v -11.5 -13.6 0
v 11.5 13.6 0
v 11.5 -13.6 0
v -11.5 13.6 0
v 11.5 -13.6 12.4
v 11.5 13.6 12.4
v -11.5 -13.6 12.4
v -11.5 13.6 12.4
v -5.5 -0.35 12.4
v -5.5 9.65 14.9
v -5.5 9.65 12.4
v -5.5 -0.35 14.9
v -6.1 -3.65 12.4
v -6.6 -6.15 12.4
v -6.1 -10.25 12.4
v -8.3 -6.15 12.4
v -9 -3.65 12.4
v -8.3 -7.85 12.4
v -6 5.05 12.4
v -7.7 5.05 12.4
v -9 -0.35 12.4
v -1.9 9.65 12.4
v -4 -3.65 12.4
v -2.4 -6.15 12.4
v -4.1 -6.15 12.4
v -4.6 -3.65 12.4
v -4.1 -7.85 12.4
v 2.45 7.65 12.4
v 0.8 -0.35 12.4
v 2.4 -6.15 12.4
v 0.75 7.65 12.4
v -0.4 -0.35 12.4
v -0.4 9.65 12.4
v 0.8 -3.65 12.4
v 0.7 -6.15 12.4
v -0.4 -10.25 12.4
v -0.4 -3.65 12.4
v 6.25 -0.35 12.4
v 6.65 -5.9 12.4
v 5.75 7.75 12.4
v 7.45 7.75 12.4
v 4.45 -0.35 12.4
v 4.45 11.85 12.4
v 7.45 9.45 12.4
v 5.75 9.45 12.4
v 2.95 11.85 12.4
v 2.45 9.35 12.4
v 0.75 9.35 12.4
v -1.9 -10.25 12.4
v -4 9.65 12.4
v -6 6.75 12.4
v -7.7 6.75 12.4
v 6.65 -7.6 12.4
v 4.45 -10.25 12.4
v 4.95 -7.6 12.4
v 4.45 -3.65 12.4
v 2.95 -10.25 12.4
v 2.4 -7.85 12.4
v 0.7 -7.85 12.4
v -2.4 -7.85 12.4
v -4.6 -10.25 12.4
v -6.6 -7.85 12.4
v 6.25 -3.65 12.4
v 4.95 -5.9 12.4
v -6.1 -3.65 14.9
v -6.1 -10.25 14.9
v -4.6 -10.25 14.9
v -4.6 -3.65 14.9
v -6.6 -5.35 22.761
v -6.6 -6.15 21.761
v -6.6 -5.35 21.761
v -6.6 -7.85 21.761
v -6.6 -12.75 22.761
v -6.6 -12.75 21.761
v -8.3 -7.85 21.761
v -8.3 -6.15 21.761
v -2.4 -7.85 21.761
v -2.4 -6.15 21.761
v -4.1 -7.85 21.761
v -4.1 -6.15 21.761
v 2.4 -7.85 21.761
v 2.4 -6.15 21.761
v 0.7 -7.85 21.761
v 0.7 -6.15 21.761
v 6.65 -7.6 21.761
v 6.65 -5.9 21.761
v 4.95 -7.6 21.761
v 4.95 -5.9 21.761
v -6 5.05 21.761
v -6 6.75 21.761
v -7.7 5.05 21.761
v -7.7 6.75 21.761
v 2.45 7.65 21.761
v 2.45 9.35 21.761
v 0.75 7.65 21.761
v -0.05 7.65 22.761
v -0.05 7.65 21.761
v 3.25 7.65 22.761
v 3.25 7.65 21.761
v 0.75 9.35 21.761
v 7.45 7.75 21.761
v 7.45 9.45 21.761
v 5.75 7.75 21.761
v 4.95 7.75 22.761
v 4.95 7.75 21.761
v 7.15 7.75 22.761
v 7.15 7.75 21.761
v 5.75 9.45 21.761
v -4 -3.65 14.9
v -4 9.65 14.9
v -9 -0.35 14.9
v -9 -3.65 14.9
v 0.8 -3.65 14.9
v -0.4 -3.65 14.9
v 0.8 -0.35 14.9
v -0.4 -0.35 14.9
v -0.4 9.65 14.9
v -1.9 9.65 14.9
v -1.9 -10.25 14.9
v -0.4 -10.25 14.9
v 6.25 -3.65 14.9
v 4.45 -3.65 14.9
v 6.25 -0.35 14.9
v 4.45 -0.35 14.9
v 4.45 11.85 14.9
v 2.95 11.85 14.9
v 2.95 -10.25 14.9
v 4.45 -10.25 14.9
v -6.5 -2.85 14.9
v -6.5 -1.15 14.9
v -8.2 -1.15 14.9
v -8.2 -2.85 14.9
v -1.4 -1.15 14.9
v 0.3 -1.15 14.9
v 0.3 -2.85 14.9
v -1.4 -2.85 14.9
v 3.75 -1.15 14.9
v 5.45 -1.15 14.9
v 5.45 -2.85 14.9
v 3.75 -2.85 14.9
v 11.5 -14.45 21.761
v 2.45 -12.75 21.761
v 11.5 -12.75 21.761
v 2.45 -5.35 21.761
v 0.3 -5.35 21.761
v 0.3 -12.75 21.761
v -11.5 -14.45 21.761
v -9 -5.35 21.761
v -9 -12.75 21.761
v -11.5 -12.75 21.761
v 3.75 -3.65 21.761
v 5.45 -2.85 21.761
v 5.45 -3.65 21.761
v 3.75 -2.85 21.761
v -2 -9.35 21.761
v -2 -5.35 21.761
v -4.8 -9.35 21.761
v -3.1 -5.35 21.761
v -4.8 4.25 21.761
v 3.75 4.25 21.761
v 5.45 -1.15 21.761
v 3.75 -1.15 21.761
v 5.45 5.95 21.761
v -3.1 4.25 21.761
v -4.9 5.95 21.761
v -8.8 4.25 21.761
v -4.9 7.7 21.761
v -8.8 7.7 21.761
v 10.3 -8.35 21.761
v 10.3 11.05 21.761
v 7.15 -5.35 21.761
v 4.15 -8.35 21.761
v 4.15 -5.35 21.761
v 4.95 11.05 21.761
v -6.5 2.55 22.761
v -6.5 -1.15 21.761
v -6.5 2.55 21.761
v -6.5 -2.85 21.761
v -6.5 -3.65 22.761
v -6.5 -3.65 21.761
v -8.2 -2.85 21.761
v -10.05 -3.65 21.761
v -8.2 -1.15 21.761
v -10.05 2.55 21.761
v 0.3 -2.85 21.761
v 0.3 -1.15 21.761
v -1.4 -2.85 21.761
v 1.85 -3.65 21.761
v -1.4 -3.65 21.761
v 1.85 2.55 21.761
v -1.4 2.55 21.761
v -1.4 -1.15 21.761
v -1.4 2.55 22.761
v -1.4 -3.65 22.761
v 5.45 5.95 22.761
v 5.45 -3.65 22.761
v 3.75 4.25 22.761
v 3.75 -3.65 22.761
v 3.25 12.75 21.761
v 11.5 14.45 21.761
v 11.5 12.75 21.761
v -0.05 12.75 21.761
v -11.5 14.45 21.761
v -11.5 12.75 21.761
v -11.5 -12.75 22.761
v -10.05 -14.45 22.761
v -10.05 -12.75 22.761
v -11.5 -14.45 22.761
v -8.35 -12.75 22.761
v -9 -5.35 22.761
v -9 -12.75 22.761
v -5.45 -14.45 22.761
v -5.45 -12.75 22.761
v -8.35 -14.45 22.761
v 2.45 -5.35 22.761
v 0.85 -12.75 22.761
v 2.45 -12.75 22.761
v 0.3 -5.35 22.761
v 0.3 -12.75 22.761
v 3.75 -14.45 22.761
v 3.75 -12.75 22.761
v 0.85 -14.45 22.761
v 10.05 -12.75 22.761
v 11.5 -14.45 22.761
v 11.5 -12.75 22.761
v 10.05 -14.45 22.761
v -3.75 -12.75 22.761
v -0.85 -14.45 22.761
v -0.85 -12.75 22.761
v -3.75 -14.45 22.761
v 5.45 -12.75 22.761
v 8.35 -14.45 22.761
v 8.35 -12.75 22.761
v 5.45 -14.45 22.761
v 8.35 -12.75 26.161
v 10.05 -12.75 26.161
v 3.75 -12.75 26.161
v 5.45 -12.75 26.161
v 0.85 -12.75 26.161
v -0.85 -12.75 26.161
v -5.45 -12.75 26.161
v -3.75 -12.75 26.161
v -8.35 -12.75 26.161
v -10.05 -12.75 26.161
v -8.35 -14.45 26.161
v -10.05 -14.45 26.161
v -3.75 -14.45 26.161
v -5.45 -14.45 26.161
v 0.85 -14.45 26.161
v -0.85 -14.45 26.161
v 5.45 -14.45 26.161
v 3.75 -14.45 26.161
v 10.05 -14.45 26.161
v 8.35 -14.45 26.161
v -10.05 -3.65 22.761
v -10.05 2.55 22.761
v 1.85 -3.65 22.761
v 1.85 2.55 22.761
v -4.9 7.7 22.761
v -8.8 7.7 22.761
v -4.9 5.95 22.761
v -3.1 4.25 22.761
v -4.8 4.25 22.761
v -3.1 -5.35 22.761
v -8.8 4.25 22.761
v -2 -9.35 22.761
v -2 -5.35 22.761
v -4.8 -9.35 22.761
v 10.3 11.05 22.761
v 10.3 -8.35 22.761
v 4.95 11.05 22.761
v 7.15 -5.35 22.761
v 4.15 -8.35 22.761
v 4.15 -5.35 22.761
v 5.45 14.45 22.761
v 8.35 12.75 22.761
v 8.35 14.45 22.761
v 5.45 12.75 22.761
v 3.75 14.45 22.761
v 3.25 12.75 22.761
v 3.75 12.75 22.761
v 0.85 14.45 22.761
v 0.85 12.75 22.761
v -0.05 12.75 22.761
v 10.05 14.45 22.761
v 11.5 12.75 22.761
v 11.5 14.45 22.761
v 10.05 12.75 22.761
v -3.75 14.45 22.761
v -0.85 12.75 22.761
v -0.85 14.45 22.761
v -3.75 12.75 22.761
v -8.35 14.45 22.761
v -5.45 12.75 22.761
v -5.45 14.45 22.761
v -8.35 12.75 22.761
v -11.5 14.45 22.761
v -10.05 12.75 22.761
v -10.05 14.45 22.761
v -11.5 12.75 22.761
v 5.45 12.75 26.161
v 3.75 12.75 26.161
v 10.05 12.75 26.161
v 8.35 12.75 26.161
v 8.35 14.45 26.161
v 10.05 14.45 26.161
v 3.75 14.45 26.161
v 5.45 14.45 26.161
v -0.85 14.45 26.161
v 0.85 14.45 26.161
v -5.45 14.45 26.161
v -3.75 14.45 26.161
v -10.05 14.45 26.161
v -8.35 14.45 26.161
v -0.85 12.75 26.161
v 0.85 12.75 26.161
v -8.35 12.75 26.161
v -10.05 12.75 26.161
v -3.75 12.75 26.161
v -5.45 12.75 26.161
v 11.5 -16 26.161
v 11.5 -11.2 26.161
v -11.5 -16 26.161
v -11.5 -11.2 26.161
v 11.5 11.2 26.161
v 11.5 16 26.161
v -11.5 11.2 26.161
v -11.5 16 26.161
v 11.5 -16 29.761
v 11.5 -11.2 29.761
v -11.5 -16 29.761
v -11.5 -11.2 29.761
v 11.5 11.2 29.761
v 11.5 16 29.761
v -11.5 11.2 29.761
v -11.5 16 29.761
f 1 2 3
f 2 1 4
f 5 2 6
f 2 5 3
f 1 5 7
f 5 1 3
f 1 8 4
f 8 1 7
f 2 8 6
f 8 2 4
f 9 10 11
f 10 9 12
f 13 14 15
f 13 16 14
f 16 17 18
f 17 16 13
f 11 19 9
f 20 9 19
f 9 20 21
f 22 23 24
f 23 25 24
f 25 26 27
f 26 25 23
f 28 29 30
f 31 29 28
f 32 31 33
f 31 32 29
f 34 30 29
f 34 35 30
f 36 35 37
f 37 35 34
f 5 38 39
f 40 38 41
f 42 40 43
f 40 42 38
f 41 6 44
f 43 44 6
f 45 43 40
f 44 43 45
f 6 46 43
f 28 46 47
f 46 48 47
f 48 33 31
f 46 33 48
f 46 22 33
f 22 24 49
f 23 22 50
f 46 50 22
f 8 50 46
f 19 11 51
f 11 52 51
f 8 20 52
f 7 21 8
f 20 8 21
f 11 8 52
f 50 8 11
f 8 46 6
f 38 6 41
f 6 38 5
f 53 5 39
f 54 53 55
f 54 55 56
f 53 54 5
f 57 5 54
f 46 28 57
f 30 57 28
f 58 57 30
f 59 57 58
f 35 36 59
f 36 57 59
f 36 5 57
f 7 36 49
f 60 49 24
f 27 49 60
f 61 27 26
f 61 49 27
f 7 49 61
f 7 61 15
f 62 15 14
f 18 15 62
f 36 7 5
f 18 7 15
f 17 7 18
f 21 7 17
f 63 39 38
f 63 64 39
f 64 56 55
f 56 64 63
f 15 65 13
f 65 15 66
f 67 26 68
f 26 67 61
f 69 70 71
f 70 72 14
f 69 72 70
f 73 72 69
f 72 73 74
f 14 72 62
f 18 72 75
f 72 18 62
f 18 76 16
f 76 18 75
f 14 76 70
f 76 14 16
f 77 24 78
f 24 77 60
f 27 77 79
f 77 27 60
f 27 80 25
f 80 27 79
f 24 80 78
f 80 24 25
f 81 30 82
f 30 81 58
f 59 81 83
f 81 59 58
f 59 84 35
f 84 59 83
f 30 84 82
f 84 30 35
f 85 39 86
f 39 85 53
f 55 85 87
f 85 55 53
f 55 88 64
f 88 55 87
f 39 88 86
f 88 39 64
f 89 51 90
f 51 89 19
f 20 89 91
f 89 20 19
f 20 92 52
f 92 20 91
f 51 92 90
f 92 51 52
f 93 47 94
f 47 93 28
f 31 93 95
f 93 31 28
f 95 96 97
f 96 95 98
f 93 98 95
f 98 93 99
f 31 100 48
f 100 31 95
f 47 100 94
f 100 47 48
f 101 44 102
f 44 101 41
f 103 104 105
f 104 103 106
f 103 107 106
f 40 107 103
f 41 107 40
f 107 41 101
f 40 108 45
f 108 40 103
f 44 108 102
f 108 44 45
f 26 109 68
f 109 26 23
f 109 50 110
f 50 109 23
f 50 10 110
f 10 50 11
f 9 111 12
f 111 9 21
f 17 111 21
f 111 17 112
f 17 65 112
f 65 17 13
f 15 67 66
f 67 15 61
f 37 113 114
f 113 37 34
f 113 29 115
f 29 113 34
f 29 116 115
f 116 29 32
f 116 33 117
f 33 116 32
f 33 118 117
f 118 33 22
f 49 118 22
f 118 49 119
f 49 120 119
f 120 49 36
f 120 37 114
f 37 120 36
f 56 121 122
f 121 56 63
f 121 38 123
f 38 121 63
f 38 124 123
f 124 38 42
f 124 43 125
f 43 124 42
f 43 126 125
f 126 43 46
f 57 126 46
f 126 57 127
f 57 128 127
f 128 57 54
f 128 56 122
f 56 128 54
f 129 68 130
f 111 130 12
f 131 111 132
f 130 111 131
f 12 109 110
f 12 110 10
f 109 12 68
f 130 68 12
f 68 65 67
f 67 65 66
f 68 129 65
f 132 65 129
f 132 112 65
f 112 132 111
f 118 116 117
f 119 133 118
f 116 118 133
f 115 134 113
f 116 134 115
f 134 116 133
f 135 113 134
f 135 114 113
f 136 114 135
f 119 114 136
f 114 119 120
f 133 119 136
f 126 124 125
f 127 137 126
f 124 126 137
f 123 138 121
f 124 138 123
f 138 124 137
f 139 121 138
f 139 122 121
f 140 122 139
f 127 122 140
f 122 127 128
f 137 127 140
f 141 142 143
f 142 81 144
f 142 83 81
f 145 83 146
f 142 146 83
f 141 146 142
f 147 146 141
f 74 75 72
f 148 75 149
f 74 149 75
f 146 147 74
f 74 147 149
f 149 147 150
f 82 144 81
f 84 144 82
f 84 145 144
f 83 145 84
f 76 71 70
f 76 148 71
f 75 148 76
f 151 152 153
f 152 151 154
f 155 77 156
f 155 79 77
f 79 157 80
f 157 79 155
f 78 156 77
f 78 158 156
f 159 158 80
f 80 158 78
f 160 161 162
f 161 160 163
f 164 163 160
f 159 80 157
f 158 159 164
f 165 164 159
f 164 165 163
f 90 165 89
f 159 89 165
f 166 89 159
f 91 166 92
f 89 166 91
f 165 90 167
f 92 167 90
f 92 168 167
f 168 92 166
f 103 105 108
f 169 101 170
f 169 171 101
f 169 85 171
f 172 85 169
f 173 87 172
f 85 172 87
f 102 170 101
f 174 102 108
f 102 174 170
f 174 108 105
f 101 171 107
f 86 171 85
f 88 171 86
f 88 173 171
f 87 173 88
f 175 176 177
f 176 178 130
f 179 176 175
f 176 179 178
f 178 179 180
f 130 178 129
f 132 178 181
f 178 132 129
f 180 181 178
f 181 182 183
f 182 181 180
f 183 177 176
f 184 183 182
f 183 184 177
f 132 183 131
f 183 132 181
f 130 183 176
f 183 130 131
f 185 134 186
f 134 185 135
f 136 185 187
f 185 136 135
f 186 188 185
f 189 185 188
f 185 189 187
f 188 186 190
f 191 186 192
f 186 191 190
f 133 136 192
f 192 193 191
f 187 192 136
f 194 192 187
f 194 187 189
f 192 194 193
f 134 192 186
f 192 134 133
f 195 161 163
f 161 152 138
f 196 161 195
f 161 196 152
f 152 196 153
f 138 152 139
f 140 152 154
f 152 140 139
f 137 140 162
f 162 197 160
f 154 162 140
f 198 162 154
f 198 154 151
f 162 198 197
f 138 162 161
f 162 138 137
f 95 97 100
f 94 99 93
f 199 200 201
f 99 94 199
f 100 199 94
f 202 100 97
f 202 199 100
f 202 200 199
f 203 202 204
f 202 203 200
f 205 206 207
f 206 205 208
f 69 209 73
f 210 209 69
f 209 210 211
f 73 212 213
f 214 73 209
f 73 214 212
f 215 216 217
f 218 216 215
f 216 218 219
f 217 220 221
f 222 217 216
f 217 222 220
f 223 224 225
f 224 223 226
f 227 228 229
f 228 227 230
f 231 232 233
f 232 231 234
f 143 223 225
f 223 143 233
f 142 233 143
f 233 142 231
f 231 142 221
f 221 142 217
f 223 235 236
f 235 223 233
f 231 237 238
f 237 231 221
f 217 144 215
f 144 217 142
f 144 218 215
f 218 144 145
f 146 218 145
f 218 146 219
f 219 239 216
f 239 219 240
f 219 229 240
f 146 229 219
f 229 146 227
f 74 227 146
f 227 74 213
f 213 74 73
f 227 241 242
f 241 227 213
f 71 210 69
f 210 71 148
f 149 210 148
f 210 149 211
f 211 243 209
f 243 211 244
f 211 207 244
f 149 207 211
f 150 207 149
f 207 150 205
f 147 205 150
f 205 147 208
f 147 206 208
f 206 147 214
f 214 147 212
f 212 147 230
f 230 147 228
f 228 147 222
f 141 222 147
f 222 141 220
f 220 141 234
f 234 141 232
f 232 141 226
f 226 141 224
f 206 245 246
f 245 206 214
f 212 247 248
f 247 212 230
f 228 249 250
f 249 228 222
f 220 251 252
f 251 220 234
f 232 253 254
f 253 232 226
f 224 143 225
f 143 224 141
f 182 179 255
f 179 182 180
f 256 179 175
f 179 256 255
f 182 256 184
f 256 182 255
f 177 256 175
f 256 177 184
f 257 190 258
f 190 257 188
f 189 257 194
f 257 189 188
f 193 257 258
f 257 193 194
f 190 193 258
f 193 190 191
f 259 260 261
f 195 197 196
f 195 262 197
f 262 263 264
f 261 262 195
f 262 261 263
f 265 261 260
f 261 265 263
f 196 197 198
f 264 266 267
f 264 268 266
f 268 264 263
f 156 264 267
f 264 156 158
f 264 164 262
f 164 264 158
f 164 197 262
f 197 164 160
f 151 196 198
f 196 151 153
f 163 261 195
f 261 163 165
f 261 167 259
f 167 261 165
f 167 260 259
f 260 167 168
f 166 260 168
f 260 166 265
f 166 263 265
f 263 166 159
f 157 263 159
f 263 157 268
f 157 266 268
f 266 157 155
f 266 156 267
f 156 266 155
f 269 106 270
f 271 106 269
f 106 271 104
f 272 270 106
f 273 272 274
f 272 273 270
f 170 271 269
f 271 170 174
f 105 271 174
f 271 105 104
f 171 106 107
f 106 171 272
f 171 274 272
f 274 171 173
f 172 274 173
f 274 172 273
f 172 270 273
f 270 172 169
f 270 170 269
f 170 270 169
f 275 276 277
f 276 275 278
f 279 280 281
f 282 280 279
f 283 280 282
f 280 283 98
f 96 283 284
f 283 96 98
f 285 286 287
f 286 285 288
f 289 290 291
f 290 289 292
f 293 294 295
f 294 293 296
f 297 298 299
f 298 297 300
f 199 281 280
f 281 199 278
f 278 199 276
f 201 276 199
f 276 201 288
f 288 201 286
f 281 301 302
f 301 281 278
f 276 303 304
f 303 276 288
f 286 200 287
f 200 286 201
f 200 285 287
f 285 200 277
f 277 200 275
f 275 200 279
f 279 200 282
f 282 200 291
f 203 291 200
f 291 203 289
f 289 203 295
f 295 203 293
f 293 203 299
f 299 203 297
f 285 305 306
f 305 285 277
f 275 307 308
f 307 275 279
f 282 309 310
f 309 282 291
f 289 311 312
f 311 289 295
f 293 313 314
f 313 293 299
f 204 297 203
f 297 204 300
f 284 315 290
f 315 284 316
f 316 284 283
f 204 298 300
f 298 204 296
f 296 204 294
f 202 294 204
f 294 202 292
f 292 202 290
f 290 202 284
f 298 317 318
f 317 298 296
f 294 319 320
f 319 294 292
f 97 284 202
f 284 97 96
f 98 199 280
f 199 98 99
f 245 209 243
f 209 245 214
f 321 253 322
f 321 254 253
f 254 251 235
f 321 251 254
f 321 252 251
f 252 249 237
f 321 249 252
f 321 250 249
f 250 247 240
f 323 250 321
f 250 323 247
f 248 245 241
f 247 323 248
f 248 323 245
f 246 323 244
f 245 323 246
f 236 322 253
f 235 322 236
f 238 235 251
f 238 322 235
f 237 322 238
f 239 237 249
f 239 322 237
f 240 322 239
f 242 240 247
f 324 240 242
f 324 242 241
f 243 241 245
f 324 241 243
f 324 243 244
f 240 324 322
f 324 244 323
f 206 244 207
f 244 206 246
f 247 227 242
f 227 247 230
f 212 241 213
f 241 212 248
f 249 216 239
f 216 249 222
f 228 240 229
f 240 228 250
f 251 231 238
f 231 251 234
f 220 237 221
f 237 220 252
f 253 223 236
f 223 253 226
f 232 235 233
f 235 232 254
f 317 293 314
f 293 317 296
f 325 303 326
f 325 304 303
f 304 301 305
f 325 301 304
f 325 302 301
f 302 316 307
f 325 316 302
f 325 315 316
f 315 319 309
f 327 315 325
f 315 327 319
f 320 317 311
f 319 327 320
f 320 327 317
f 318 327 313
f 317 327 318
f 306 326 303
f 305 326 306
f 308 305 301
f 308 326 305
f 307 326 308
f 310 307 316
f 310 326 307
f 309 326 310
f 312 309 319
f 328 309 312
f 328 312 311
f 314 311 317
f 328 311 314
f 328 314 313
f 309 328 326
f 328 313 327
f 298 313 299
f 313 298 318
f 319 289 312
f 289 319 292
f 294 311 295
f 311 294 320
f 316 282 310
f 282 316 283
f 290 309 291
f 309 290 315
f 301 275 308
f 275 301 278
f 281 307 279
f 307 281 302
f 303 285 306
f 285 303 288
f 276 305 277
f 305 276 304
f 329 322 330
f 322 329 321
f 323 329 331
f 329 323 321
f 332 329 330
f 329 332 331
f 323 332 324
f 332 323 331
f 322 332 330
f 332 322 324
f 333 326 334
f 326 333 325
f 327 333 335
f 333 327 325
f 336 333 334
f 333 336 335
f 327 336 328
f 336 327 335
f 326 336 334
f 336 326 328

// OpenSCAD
// Generated by SolidPython 0.4.2 on 2020-09-29 23:22:09
//!OpenSCAD

scale(v = 0.0100000000) {
	translate(v = [-1150, -1360, 0]) {
		union() {
			color(c = [0.4000000000, 0.4000000000, 0.4000000000]) {
				translate(v = [0, 0, 0]) {
					linear_extrude(height = 1000.0000000000) {
						polygon(paths = [[0, 1, 2, 3]], points = [[0, 0], [0, 2720], [2300, 2720], [2300, 0]]);
					}
				}
			}
			color(c = [0.2000000000, 0.6000000000, 0.2000000000]) {
				translate(v = [0, 0, 1000.0000000000]) {
					linear_extrude(height = 120.0000000000) {
						polygon(paths = [[0, 1, 2, 3]], points = [[0, 1305], [0, 2720], [2300, 2720], [2300, 1305]]);
					}
				}
			}
			color(c = [0.4000000000, 0.4000000000, 0.4000000000]) {
				translate(v = [0, 0, 1000.0000000000]) {
					linear_extrude(height = 120.0000000000) {
						polygon(paths = [[0, 1, 2, 3]], points = [[0, 0], [0, 1305], [2300, 1305], [2300, 0]]);
					}
				}
			}
			color(c = [0.9000000000, 0.6000000000, 0.6000000000]) {
				translate(v = [0, 0, 1120.0000000000]) {
					linear_extrude(height = 120.0000000000) {
						polygon(paths = [[0, 1, 2, 3]], points = [[340, 1775], [340, 2195], [600, 2195], [600, 1775]]);
					}
				}
			}
			color(c = [0.9000000000, 0.6000000000, 0.6000000000]) {
				translate(v = [0, 0, 1120.0000000000]) {
					linear_extrude(height = 120.0000000000) {
						polygon(paths = [[0, 1, 2, 3]], points = [[750, 1775], [750, 2195], [960, 2195], [960, 1775]]);
					}
				}
			}
			color(c = [0.9000000000, 0.6000000000, 0.6000000000]) {
				translate(v = [0, 0, 1120.0000000000]) {
					linear_extrude(height = 120.0000000000) {
						polygon(paths = [[0, 1, 2, 3, 4, 5]], points = [[1110, 1775], [1110, 2195], [1185, 2195], [1185, 2415], [1445, 2415], [1445, 1775]]);
					}
				}
			}
			color(c = [0.9000000000, 0.6000000000, 0.6000000000]) {
				translate(v = [0, 0, 1120.0000000000]) {
					linear_extrude(height = 120.0000000000) {
						polygon(paths = [[0, 1, 2, 3]], points = [[1595, 1775], [1595, 2415], [1935, 2415], [1935, 1775]]);
					}
				}
			}
			color(c = [0.9000000000, 0.6000000000, 0.9000000000]) {
				translate(v = [0, 0, 1120.0000000000]) {
					linear_extrude(height = 120.0000000000) {
						polygon(paths = [[0, 1, 2, 3]], points = [[280, 465], [280, 885], [540, 885], [540, 465]]);
					}
				}
			}
			color(c = [0.9000000000, 0.6000000000, 0.9000000000]) {
				translate(v = [0, 0, 1120.0000000000]) {
					linear_extrude(height = 120.0000000000) {
						polygon(paths = [[0, 1, 2, 3]], points = [[690, 465], [690, 885], [960, 885], [960, 465]]);
					}
				}
			}
			color(c = [0.9000000000, 0.6000000000, 0.9000000000]) {
				translate(v = [0, 0, 1120.0000000000]) {
					linear_extrude(height = 120.0000000000) {
						polygon(paths = [[0, 1, 2, 3]], points = [[1110, 465], [1110, 885], [1445, 885], [1445, 465]]);
					}
				}
			}
			color(c = [0.9000000000, 0.6000000000, 0.9000000000]) {
				translate(v = [0, 0, 1120.0000000000]) {
					linear_extrude(height = 120.0000000000) {
						polygon(paths = [[0, 1, 2, 3]], points = [[1595, 465], [1595, 885], [1855, 885], [1855, 465]]);
					}
				}
			}
			color(c = [0.2000000000, 0.6000000000, 0.2000000000]) {
				translate(v = [0, 0, 1120.0000000000]) {
					linear_extrude(height = 120.0000000000) {
						difference() {
							polygon(paths = [[0, 1, 2, 3]], points = [[0, 1305], [0, 2720], [2300, 2720], [2300, 1305]]);
							polygon(paths = [[0, 1, 2, 3]], points = [[340, 1775], [600, 1775], [600, 2195], [340, 2195]]);
							polygon(paths = [[0, 1, 2, 3]], points = [[750, 1775], [960, 1775], [960, 2195], [750, 2195]]);
							polygon(paths = [[0, 1, 2, 3]], points = [[1595, 1775], [1935, 1775], [1935, 2415], [1595, 2415]]);
							polygon(paths = [[0, 1, 2, 3, 4, 5]], points = [[1110, 1775], [1445, 1775], [1445, 2415], [1185, 2415], [1185, 2195], [1110, 2195]]);
						}
					}
				}
			}
			color(c = [0.4000000000, 0.4000000000, 0.4000000000]) {
				translate(v = [0, 0, 1120.0000000000]) {
					linear_extrude(height = 120.0000000000) {
						difference() {
							polygon(paths = [[0, 1, 2, 3]], points = [[0, 0], [0, 1305], [2300, 1305], [2300, 0]]);
							polygon(paths = [[0, 1, 2, 3]], points = [[280, 465], [540, 465], [540, 885], [280, 885]]);
							polygon(paths = [[0, 1, 2, 3]], points = [[690, 465], [960, 465], [960, 885], [690, 885]]);
							polygon(paths = [[0, 1, 2, 3]], points = [[1110, 465], [1445, 465], [1445, 885], [1110, 885]]);
							polygon(paths = [[0, 1, 2, 3]], points = [[1595, 465], [1855, 465], [1855, 885], [1595, 885]]);
						}
					}
				}
			}
			color(c = [0.1000000000, 0.1000000000, 0.1000000000]) {
				translate(v = [0, 0, 1240.0000000000]) {
					linear_extrude(height = 70.0000000000) {
						polygon(paths = [[0, 1, 2, 3]], points = [[320, 575], [320, 745], [490, 745], [490, 575]]);
					}
				}
			}
			color(c = [0.1000000000, 0.1000000000, 0.1000000000]) {
				translate(v = [0, 0, 1240.0000000000]) {
					linear_extrude(height = 70.0000000000) {
						polygon(paths = [[0, 1, 2, 3]], points = [[740, 575], [740, 745], [910, 745], [910, 575]]);
					}
				}
			}
			color(c = [0.1000000000, 0.1000000000, 0.1000000000]) {
				translate(v = [0, 0, 1240.0000000000]) {
					linear_extrude(height = 70.0000000000) {
						polygon(paths = [[0, 1, 2, 3]], points = [[1220, 575], [1220, 745], [1390, 745], [1390, 575]]);
					}
				}
			}
			color(c = [0.1000000000, 0.1000000000, 0.1000000000]) {
				translate(v = [0, 0, 1240.0000000000]) {
					linear_extrude(height = 70.0000000000) {
						polygon(paths = [[0, 1, 2, 3]], points = [[1645, 600], [1645, 770], [1815, 770], [1815, 600]]);
					}
				}
			}
			color(c = [0.1000000000, 0.1000000000, 0.1000000000]) {
				translate(v = [0, 0, 1240.0000000000]) {
					linear_extrude(height = 70.0000000000) {
						polygon(paths = [[0, 1, 2, 3]], points = [[380, 1865], [380, 2035], [550, 2035], [550, 1865]]);
					}
				}
			}
			color(c = [0.1000000000, 0.1000000000, 0.1000000000]) {
				translate(v = [0, 0, 1240.0000000000]) {
					linear_extrude(height = 70.0000000000) {
						polygon(paths = [[0, 1, 2, 3]], points = [[1225, 2125], [1225, 2295], [1395, 2295], [1395, 2125]]);
					}
				}
			}
			color(c = [0.1000000000, 0.1000000000, 0.1000000000]) {
				translate(v = [0, 0, 1240.0000000000]) {
					linear_extrude(height = 70.0000000000) {
						polygon(paths = [[0, 1, 2, 3]], points = [[1725, 2135], [1725, 2305], [1895, 2305], [1895, 2135]]);
					}
				}
			}
			color(c = [1.0000000000, 1.0000000000, 1.0000000000]) {
				translate(v = [0, 0, 1240.0000000000]) {
					linear_extrude(height = 70.0000000000) {
						polygon(paths = [[0, 1, 2, 3, 4, 5, 6, 7, 8, 9]], points = [[540, 335], [540, 995], [250, 995], [250, 1325], [600, 1325], [600, 2325], [750, 2325], [750, 995], [690, 995], [690, 335]]);
					}
				}
			}
			color(c = [1.0000000000, 1.0000000000, 1.0000000000]) {
				translate(v = [0, 0, 1240.0000000000]) {
					linear_extrude(height = 70.0000000000) {
						polygon(paths = [[0, 1, 2, 3, 4, 5, 6, 7]], points = [[960, 335], [960, 2325], [1110, 2325], [1110, 1325], [1230, 1325], [1230, 995], [1110, 995], [1110, 335]]);
					}
				}
			}
			color(c = [1.0000000000, 1.0000000000, 1.0000000000]) {
				translate(v = [0, 0, 1240.0000000000]) {
					linear_extrude(height = 70.0000000000) {
						polygon(paths = [[0, 1, 2, 3, 4, 5, 6, 7]], points = [[1445, 335], [1445, 2545], [1595, 2545], [1595, 1325], [1775, 1325], [1775, 995], [1595, 995], [1595, 335]]);
					}
				}
			}
			color(c = [0.1000000000, 0.1000000000, 0.1000000000]) {
				translate(v = [0, 0, 1310.0000000000]) {
					linear_extrude(height = 180.0000000000) {
						polygon(paths = [[0, 1, 2, 3]], points = [[320, 575], [320, 745], [490, 745], [490, 575]]);
					}
				}
			}
			color(c = [0.1000000000, 0.1000000000, 0.1000000000]) {
				translate(v = [0, 0, 1310.0000000000]) {
					linear_extrude(height = 180.0000000000) {
						polygon(paths = [[0, 1, 2, 3]], points = [[740, 575], [740, 745], [910, 745], [910, 575]]);
					}
				}
			}
			color(c = [0.1000000000, 0.1000000000, 0.1000000000]) {
				translate(v = [0, 0, 1310.0000000000]) {
					linear_extrude(height = 180.0000000000) {
						polygon(paths = [[0, 1, 2, 3]], points = [[1220, 575], [1220, 745], [1390, 745], [1390, 575]]);
					}
				}
			}
			color(c = [0.1000000000, 0.1000000000, 0.1000000000]) {
				translate(v = [0, 0, 1310.0000000000]) {
					linear_extrude(height = 180.0000000000) {
						polygon(paths = [[0, 1, 2, 3]], points = [[1645, 600], [1645, 770], [1815, 770], [1815, 600]]);
					}
				}
			}
			color(c = [0.1000000000, 0.1000000000, 0.1000000000]) {
				translate(v = [0, 0, 1310.0000000000]) {
					linear_extrude(height = 180.0000000000) {
						polygon(paths = [[0, 1, 2, 3]], points = [[380, 1865], [380, 2035], [550, 2035], [550, 1865]]);
					}
				}
			}
			color(c = [0.1000000000, 0.1000000000, 0.1000000000]) {
				translate(v = [0, 0, 1310.0000000000]) {
					linear_extrude(height = 180.0000000000) {
						polygon(paths = [[0, 1, 2, 3]], points = [[1225, 2125], [1225, 2295], [1395, 2295], [1395, 2125]]);
					}
				}
			}
			color(c = [0.1000000000, 0.1000000000, 0.1000000000]) {
				translate(v = [0, 0, 1310.0000000000]) {
					linear_extrude(height = 180.0000000000) {
						polygon(paths = [[0, 1, 2, 3]], points = [[1725, 2135], [1725, 2305], [1895, 2305], [1895, 2135]]);
					}
				}
			}
			color(c = [0.7000000000, 0, 0]) {
				translate(v = [0, 0, 1310.0000000000]) {
					linear_extrude(height = 180.0000000000) {
						polygon(paths = [[0, 1, 2, 3, 4, 5, 6, 7, 8, 9]], points = [[540, 335], [540, 995], [250, 995], [250, 1325], [600, 1325], [600, 2325], [750, 2325], [750, 995], [690, 995], [690, 335]]);
					}
				}
			}
			color(c = [0.7000000000, 0, 0]) {
				translate(v = [0, 0, 1310.0000000000]) {
					linear_extrude(height = 180.0000000000) {
						polygon(paths = [[0, 1, 2, 3, 4, 5, 6, 7]], points = [[960, 335], [960, 2325], [1110, 2325], [1110, 1325], [1230, 1325], [1230, 995], [1110, 995], [1110, 335]]);
					}
				}
			}
			color(c = [0.7000000000, 0, 0]) {
				translate(v = [0, 0, 1310.0000000000]) {
					linear_extrude(height = 180.0000000000) {
						polygon(paths = [[0, 1, 2, 3, 4, 5, 6, 7]], points = [[1445, 335], [1445, 2545], [1595, 2545], [1595, 1325], [1775, 1325], [1775, 995], [1595, 995], [1595, 335]]);
					}
				}
			}
			color(c = [0.1000000000, 0.1000000000, 0.1000000000]) {
				translate(v = [0, 0, 1490.0000000000]) {
					linear_extrude(height = 686.1000000000) {
						polygon(paths = [[0, 1, 2, 3]], points = [[320, 575], [320, 745], [490, 745], [490, 575]]);
					}
				}
			}
			color(c = [0.1000000000, 0.1000000000, 0.1000000000]) {
				translate(v = [0, 0, 1490.0000000000]) {
					linear_extrude(height = 686.1000000000) {
						polygon(paths = [[0, 1, 2, 3]], points = [[740, 575], [740, 745], [910, 745], [910, 575]]);
					}
				}
			}
			color(c = [0.1000000000, 0.1000000000, 0.1000000000]) {
				translate(v = [0, 0, 1490.0000000000]) {
					linear_extrude(height = 686.1000000000) {
						polygon(paths = [[0, 1, 2, 3]], points = [[1220, 575], [1220, 745], [1390, 745], [1390, 575]]);
					}
				}
			}
			color(c = [0.1000000000, 0.1000000000, 0.1000000000]) {
				translate(v = [0, 0, 1490.0000000000]) {
					linear_extrude(height = 686.1000000000) {
						polygon(paths = [[0, 1, 2, 3]], points = [[1645, 600], [1645, 770], [1815, 770], [1815, 600]]);
					}
				}
			}
			color(c = [0.1000000000, 0.1000000000, 0.1000000000]) {
				translate(v = [0, 0, 1490.0000000000]) {
					linear_extrude(height = 686.1000000000) {
						polygon(paths = [[0, 1, 2, 3]], points = [[330, 1075], [330, 1245], [500, 1245], [500, 1075]]);
					}
				}
			}
			color(c = [0.1000000000, 0.1000000000, 0.1000000000]) {
				translate(v = [0, 0, 1490.0000000000]) {
					linear_extrude(height = 686.1000000000) {
						polygon(paths = [[0, 1, 2, 3]], points = [[1010, 1075], [1010, 1245], [1180, 1245], [1180, 1075]]);
					}
				}
			}
			color(c = [0.1000000000, 0.1000000000, 0.1000000000]) {
				translate(v = [0, 0, 1490.0000000000]) {
					linear_extrude(height = 686.1000000000) {
						polygon(paths = [[0, 1, 2, 3]], points = [[1525, 1075], [1525, 1245], [1695, 1245], [1695, 1075]]);
					}
				}
			}
			color(c = [0.1000000000, 0.1000000000, 0.1000000000]) {
				translate(v = [0, 0, 1490.0000000000]) {
					linear_extrude(height = 686.1000000000) {
						polygon(paths = [[0, 1, 2, 3]], points = [[380, 1865], [380, 2035], [550, 2035], [550, 1865]]);
					}
				}
			}
			color(c = [0.1000000000, 0.1000000000, 0.1000000000]) {
				translate(v = [0, 0, 1490.0000000000]) {
					linear_extrude(height = 686.1000000000) {
						polygon(paths = [[0, 1, 2, 3]], points = [[1225, 2125], [1225, 2295], [1395, 2295], [1395, 2125]]);
					}
				}
			}
			color(c = [0.1000000000, 0.1000000000, 0.1000000000]) {
				translate(v = [0, 0, 1490.0000000000]) {
					linear_extrude(height = 686.1000000000) {
						polygon(paths = [[0, 1, 2, 3]], points = [[1725, 2135], [1725, 2305], [1895, 2305], [1895, 2135]]);
					}
				}
			}
			color(c = [0.9000000000, 0.6000000000, 0.6000000000]) {
				translate(v = [0, 0, 2176.1000000000]) {
					linear_extrude(height = 100.0000000000) {
						polygon(paths = [[0, 1, 2, 3, 4, 5, 6, 7, 8, 9, 10, 11]], points = [[0, -85], [0, 85], [250, 85], [250, 825], [490, 825], [490, 85], [1180, 85], [1180, 825], [1395, 825], [1395, 85], [2300, 85], [2300, -85]]);
					}
				}
			}
			color(c = [0.9000000000, 0.6000000000, 0.6000000000]) {
				translate(v = [0, 0, 2176.1000000000]) {
					linear_extrude(height = 100.0000000000) {
						polygon(paths = [[0, 1, 2, 3]], points = [[145, 995], [145, 1615], [500, 1615], [500, 995]]);
					}
				}
			}
			color(c = [0.9000000000, 0.6000000000, 0.6000000000]) {
				translate(v = [0, 0, 2176.1000000000]) {
					linear_extrude(height = 100.0000000000) {
						polygon(paths = [[0, 1, 2, 3]], points = [[1010, 995], [1010, 1615], [1335, 1615], [1335, 995]]);
					}
				}
			}
			color(c = [0.9000000000, 0.6000000000, 0.6000000000]) {
				translate(v = [0, 0, 2176.1000000000]) {
					linear_extrude(height = 100.0000000000) {
						polygon(paths = [[0, 1, 2, 3, 4, 5, 6, 7, 8, 9, 10, 11, 12, 13]], points = [[670, 425], [670, 1785], [270, 1785], [270, 2130], [660, 2130], [660, 1955], [1695, 1955], [1695, 995], [1525, 995], [1525, 1785], [840, 1785], [840, 825], [950, 825], [950, 425]]);
					}
				}
			}
			color(c = [0.9000000000, 0.6000000000, 0.6000000000]) {
				translate(v = [0, 0, 2176.1000000000]) {
					linear_extrude(height = 100.0000000000) {
						polygon(paths = [[0, 1, 2, 3, 4, 5, 6, 7]], points = [[1565, 525], [1565, 825], [1865, 825], [1865, 2135], [1645, 2135], [1645, 2465], [2180, 2465], [2180, 525]]);
					}
				}
			}
			color(c = [0.9000000000, 0.6000000000, 0.6000000000]) {
				translate(v = [0, 0, 2176.1000000000]) {
					linear_extrude(height = 100.0000000000) {
						polygon(paths = [[0, 1, 2, 3, 4, 5, 6, 7]], points = [[1145, 2125], [1145, 2635], [0, 2635], [0, 2805], [2300, 2805], [2300, 2635], [1475, 2635], [1475, 2125]]);
					}
				}
			}
			color(c = [0.5000000000, 0.5000000000, 0.5000000000]) {
				translate(v = [0, 0, 2276.1000000000]) {
					linear_extrude(height = 340.0000000000) {
						polygon(paths = [[0, 1, 2, 3]], points = [[145, -85], [145, 85], [315, 85], [315, -85]]);
					}
				}
			}
			color(c = [0.5000000000, 0.5000000000, 0.5000000000]) {
				translate(v = [0, 0, 2276.1000000000]) {
					linear_extrude(height = 340.0000000000) {
						polygon(paths = [[0, 1, 2, 3]], points = [[605, -85], [605, 85], [775, 85], [775, -85]]);
					}
				}
			}
			color(c = [0.5000000000, 0.5000000000, 0.5000000000]) {
				translate(v = [0, 0, 2276.1000000000]) {
					linear_extrude(height = 340.0000000000) {
						polygon(paths = [[0, 1, 2, 3]], points = [[1065, -85], [1065, 85], [1235, 85], [1235, -85]]);
					}
				}
			}
			color(c = [0.5000000000, 0.5000000000, 0.5000000000]) {
				translate(v = [0, 0, 2276.1000000000]) {
					linear_extrude(height = 340.0000000000) {
						polygon(paths = [[0, 1, 2, 3]], points = [[1525, -85], [1525, 85], [1695, 85], [1695, -85]]);
					}
				}
			}
			color(c = [0.5000000000, 0.5000000000, 0.5000000000]) {
				translate(v = [0, 0, 2276.1000000000]) {
					linear_extrude(height = 340.0000000000) {
						polygon(paths = [[0, 1, 2, 3]], points = [[1985, -85], [1985, 85], [2155, 85], [2155, -85]]);
					}
				}
			}
			color(c = [0.5000000000, 0.5000000000, 0.5000000000]) {
				translate(v = [0, 0, 2276.1000000000]) {
					linear_extrude(height = 340.0000000000) {
						polygon(paths = [[0, 1, 2, 3]], points = [[145, 2635], [145, 2805], [315, 2805], [315, 2635]]);
					}
				}
			}
			color(c = [0.5000000000, 0.5000000000, 0.5000000000]) {
				translate(v = [0, 0, 2276.1000000000]) {
					linear_extrude(height = 340.0000000000) {
						polygon(paths = [[0, 1, 2, 3]], points = [[605, 2635], [605, 2805], [775, 2805], [775, 2635]]);
					}
				}
			}
			color(c = [0.5000000000, 0.5000000000, 0.5000000000]) {
				translate(v = [0, 0, 2276.1000000000]) {
					linear_extrude(height = 340.0000000000) {
						polygon(paths = [[0, 1, 2, 3]], points = [[1065, 2635], [1065, 2805], [1235, 2805], [1235, 2635]]);
					}
				}
			}
			color(c = [0.5000000000, 0.5000000000, 0.5000000000]) {
				translate(v = [0, 0, 2276.1000000000]) {
					linear_extrude(height = 340.0000000000) {
						polygon(paths = [[0, 1, 2, 3]], points = [[1525, 2635], [1525, 2805], [1695, 2805], [1695, 2635]]);
					}
				}
			}
			color(c = [0.5000000000, 0.5000000000, 0.5000000000]) {
				translate(v = [0, 0, 2276.1000000000]) {
					linear_extrude(height = 340.0000000000) {
						polygon(paths = [[0, 1, 2, 3]], points = [[1985, 2635], [1985, 2805], [2155, 2805], [2155, 2635]]);
					}
				}
			}
			color(c = [0.3000000000, 0.3000000000, 1]) {
				translate(v = [0, 0, 2616.1000000000]) {
					linear_extrude(height = 360.0000000000) {
						polygon(paths = [[0, 1, 2, 3]], points = [[0, -240], [0, 240], [2300, 240], [2300, -240]]);
					}
				}
			}
			color(c = [0.3000000000, 0.3000000000, 1]) {
				translate(v = [0, 0, 2616.1000000000]) {
					linear_extrude(height = 360.0000000000) {
						polygon(paths = [[0, 1, 2, 3]], points = [[0, 2480], [0, 2960], [2300, 2960], [2300, 2480]]);
					}
				}
			}
		}
	}
}
